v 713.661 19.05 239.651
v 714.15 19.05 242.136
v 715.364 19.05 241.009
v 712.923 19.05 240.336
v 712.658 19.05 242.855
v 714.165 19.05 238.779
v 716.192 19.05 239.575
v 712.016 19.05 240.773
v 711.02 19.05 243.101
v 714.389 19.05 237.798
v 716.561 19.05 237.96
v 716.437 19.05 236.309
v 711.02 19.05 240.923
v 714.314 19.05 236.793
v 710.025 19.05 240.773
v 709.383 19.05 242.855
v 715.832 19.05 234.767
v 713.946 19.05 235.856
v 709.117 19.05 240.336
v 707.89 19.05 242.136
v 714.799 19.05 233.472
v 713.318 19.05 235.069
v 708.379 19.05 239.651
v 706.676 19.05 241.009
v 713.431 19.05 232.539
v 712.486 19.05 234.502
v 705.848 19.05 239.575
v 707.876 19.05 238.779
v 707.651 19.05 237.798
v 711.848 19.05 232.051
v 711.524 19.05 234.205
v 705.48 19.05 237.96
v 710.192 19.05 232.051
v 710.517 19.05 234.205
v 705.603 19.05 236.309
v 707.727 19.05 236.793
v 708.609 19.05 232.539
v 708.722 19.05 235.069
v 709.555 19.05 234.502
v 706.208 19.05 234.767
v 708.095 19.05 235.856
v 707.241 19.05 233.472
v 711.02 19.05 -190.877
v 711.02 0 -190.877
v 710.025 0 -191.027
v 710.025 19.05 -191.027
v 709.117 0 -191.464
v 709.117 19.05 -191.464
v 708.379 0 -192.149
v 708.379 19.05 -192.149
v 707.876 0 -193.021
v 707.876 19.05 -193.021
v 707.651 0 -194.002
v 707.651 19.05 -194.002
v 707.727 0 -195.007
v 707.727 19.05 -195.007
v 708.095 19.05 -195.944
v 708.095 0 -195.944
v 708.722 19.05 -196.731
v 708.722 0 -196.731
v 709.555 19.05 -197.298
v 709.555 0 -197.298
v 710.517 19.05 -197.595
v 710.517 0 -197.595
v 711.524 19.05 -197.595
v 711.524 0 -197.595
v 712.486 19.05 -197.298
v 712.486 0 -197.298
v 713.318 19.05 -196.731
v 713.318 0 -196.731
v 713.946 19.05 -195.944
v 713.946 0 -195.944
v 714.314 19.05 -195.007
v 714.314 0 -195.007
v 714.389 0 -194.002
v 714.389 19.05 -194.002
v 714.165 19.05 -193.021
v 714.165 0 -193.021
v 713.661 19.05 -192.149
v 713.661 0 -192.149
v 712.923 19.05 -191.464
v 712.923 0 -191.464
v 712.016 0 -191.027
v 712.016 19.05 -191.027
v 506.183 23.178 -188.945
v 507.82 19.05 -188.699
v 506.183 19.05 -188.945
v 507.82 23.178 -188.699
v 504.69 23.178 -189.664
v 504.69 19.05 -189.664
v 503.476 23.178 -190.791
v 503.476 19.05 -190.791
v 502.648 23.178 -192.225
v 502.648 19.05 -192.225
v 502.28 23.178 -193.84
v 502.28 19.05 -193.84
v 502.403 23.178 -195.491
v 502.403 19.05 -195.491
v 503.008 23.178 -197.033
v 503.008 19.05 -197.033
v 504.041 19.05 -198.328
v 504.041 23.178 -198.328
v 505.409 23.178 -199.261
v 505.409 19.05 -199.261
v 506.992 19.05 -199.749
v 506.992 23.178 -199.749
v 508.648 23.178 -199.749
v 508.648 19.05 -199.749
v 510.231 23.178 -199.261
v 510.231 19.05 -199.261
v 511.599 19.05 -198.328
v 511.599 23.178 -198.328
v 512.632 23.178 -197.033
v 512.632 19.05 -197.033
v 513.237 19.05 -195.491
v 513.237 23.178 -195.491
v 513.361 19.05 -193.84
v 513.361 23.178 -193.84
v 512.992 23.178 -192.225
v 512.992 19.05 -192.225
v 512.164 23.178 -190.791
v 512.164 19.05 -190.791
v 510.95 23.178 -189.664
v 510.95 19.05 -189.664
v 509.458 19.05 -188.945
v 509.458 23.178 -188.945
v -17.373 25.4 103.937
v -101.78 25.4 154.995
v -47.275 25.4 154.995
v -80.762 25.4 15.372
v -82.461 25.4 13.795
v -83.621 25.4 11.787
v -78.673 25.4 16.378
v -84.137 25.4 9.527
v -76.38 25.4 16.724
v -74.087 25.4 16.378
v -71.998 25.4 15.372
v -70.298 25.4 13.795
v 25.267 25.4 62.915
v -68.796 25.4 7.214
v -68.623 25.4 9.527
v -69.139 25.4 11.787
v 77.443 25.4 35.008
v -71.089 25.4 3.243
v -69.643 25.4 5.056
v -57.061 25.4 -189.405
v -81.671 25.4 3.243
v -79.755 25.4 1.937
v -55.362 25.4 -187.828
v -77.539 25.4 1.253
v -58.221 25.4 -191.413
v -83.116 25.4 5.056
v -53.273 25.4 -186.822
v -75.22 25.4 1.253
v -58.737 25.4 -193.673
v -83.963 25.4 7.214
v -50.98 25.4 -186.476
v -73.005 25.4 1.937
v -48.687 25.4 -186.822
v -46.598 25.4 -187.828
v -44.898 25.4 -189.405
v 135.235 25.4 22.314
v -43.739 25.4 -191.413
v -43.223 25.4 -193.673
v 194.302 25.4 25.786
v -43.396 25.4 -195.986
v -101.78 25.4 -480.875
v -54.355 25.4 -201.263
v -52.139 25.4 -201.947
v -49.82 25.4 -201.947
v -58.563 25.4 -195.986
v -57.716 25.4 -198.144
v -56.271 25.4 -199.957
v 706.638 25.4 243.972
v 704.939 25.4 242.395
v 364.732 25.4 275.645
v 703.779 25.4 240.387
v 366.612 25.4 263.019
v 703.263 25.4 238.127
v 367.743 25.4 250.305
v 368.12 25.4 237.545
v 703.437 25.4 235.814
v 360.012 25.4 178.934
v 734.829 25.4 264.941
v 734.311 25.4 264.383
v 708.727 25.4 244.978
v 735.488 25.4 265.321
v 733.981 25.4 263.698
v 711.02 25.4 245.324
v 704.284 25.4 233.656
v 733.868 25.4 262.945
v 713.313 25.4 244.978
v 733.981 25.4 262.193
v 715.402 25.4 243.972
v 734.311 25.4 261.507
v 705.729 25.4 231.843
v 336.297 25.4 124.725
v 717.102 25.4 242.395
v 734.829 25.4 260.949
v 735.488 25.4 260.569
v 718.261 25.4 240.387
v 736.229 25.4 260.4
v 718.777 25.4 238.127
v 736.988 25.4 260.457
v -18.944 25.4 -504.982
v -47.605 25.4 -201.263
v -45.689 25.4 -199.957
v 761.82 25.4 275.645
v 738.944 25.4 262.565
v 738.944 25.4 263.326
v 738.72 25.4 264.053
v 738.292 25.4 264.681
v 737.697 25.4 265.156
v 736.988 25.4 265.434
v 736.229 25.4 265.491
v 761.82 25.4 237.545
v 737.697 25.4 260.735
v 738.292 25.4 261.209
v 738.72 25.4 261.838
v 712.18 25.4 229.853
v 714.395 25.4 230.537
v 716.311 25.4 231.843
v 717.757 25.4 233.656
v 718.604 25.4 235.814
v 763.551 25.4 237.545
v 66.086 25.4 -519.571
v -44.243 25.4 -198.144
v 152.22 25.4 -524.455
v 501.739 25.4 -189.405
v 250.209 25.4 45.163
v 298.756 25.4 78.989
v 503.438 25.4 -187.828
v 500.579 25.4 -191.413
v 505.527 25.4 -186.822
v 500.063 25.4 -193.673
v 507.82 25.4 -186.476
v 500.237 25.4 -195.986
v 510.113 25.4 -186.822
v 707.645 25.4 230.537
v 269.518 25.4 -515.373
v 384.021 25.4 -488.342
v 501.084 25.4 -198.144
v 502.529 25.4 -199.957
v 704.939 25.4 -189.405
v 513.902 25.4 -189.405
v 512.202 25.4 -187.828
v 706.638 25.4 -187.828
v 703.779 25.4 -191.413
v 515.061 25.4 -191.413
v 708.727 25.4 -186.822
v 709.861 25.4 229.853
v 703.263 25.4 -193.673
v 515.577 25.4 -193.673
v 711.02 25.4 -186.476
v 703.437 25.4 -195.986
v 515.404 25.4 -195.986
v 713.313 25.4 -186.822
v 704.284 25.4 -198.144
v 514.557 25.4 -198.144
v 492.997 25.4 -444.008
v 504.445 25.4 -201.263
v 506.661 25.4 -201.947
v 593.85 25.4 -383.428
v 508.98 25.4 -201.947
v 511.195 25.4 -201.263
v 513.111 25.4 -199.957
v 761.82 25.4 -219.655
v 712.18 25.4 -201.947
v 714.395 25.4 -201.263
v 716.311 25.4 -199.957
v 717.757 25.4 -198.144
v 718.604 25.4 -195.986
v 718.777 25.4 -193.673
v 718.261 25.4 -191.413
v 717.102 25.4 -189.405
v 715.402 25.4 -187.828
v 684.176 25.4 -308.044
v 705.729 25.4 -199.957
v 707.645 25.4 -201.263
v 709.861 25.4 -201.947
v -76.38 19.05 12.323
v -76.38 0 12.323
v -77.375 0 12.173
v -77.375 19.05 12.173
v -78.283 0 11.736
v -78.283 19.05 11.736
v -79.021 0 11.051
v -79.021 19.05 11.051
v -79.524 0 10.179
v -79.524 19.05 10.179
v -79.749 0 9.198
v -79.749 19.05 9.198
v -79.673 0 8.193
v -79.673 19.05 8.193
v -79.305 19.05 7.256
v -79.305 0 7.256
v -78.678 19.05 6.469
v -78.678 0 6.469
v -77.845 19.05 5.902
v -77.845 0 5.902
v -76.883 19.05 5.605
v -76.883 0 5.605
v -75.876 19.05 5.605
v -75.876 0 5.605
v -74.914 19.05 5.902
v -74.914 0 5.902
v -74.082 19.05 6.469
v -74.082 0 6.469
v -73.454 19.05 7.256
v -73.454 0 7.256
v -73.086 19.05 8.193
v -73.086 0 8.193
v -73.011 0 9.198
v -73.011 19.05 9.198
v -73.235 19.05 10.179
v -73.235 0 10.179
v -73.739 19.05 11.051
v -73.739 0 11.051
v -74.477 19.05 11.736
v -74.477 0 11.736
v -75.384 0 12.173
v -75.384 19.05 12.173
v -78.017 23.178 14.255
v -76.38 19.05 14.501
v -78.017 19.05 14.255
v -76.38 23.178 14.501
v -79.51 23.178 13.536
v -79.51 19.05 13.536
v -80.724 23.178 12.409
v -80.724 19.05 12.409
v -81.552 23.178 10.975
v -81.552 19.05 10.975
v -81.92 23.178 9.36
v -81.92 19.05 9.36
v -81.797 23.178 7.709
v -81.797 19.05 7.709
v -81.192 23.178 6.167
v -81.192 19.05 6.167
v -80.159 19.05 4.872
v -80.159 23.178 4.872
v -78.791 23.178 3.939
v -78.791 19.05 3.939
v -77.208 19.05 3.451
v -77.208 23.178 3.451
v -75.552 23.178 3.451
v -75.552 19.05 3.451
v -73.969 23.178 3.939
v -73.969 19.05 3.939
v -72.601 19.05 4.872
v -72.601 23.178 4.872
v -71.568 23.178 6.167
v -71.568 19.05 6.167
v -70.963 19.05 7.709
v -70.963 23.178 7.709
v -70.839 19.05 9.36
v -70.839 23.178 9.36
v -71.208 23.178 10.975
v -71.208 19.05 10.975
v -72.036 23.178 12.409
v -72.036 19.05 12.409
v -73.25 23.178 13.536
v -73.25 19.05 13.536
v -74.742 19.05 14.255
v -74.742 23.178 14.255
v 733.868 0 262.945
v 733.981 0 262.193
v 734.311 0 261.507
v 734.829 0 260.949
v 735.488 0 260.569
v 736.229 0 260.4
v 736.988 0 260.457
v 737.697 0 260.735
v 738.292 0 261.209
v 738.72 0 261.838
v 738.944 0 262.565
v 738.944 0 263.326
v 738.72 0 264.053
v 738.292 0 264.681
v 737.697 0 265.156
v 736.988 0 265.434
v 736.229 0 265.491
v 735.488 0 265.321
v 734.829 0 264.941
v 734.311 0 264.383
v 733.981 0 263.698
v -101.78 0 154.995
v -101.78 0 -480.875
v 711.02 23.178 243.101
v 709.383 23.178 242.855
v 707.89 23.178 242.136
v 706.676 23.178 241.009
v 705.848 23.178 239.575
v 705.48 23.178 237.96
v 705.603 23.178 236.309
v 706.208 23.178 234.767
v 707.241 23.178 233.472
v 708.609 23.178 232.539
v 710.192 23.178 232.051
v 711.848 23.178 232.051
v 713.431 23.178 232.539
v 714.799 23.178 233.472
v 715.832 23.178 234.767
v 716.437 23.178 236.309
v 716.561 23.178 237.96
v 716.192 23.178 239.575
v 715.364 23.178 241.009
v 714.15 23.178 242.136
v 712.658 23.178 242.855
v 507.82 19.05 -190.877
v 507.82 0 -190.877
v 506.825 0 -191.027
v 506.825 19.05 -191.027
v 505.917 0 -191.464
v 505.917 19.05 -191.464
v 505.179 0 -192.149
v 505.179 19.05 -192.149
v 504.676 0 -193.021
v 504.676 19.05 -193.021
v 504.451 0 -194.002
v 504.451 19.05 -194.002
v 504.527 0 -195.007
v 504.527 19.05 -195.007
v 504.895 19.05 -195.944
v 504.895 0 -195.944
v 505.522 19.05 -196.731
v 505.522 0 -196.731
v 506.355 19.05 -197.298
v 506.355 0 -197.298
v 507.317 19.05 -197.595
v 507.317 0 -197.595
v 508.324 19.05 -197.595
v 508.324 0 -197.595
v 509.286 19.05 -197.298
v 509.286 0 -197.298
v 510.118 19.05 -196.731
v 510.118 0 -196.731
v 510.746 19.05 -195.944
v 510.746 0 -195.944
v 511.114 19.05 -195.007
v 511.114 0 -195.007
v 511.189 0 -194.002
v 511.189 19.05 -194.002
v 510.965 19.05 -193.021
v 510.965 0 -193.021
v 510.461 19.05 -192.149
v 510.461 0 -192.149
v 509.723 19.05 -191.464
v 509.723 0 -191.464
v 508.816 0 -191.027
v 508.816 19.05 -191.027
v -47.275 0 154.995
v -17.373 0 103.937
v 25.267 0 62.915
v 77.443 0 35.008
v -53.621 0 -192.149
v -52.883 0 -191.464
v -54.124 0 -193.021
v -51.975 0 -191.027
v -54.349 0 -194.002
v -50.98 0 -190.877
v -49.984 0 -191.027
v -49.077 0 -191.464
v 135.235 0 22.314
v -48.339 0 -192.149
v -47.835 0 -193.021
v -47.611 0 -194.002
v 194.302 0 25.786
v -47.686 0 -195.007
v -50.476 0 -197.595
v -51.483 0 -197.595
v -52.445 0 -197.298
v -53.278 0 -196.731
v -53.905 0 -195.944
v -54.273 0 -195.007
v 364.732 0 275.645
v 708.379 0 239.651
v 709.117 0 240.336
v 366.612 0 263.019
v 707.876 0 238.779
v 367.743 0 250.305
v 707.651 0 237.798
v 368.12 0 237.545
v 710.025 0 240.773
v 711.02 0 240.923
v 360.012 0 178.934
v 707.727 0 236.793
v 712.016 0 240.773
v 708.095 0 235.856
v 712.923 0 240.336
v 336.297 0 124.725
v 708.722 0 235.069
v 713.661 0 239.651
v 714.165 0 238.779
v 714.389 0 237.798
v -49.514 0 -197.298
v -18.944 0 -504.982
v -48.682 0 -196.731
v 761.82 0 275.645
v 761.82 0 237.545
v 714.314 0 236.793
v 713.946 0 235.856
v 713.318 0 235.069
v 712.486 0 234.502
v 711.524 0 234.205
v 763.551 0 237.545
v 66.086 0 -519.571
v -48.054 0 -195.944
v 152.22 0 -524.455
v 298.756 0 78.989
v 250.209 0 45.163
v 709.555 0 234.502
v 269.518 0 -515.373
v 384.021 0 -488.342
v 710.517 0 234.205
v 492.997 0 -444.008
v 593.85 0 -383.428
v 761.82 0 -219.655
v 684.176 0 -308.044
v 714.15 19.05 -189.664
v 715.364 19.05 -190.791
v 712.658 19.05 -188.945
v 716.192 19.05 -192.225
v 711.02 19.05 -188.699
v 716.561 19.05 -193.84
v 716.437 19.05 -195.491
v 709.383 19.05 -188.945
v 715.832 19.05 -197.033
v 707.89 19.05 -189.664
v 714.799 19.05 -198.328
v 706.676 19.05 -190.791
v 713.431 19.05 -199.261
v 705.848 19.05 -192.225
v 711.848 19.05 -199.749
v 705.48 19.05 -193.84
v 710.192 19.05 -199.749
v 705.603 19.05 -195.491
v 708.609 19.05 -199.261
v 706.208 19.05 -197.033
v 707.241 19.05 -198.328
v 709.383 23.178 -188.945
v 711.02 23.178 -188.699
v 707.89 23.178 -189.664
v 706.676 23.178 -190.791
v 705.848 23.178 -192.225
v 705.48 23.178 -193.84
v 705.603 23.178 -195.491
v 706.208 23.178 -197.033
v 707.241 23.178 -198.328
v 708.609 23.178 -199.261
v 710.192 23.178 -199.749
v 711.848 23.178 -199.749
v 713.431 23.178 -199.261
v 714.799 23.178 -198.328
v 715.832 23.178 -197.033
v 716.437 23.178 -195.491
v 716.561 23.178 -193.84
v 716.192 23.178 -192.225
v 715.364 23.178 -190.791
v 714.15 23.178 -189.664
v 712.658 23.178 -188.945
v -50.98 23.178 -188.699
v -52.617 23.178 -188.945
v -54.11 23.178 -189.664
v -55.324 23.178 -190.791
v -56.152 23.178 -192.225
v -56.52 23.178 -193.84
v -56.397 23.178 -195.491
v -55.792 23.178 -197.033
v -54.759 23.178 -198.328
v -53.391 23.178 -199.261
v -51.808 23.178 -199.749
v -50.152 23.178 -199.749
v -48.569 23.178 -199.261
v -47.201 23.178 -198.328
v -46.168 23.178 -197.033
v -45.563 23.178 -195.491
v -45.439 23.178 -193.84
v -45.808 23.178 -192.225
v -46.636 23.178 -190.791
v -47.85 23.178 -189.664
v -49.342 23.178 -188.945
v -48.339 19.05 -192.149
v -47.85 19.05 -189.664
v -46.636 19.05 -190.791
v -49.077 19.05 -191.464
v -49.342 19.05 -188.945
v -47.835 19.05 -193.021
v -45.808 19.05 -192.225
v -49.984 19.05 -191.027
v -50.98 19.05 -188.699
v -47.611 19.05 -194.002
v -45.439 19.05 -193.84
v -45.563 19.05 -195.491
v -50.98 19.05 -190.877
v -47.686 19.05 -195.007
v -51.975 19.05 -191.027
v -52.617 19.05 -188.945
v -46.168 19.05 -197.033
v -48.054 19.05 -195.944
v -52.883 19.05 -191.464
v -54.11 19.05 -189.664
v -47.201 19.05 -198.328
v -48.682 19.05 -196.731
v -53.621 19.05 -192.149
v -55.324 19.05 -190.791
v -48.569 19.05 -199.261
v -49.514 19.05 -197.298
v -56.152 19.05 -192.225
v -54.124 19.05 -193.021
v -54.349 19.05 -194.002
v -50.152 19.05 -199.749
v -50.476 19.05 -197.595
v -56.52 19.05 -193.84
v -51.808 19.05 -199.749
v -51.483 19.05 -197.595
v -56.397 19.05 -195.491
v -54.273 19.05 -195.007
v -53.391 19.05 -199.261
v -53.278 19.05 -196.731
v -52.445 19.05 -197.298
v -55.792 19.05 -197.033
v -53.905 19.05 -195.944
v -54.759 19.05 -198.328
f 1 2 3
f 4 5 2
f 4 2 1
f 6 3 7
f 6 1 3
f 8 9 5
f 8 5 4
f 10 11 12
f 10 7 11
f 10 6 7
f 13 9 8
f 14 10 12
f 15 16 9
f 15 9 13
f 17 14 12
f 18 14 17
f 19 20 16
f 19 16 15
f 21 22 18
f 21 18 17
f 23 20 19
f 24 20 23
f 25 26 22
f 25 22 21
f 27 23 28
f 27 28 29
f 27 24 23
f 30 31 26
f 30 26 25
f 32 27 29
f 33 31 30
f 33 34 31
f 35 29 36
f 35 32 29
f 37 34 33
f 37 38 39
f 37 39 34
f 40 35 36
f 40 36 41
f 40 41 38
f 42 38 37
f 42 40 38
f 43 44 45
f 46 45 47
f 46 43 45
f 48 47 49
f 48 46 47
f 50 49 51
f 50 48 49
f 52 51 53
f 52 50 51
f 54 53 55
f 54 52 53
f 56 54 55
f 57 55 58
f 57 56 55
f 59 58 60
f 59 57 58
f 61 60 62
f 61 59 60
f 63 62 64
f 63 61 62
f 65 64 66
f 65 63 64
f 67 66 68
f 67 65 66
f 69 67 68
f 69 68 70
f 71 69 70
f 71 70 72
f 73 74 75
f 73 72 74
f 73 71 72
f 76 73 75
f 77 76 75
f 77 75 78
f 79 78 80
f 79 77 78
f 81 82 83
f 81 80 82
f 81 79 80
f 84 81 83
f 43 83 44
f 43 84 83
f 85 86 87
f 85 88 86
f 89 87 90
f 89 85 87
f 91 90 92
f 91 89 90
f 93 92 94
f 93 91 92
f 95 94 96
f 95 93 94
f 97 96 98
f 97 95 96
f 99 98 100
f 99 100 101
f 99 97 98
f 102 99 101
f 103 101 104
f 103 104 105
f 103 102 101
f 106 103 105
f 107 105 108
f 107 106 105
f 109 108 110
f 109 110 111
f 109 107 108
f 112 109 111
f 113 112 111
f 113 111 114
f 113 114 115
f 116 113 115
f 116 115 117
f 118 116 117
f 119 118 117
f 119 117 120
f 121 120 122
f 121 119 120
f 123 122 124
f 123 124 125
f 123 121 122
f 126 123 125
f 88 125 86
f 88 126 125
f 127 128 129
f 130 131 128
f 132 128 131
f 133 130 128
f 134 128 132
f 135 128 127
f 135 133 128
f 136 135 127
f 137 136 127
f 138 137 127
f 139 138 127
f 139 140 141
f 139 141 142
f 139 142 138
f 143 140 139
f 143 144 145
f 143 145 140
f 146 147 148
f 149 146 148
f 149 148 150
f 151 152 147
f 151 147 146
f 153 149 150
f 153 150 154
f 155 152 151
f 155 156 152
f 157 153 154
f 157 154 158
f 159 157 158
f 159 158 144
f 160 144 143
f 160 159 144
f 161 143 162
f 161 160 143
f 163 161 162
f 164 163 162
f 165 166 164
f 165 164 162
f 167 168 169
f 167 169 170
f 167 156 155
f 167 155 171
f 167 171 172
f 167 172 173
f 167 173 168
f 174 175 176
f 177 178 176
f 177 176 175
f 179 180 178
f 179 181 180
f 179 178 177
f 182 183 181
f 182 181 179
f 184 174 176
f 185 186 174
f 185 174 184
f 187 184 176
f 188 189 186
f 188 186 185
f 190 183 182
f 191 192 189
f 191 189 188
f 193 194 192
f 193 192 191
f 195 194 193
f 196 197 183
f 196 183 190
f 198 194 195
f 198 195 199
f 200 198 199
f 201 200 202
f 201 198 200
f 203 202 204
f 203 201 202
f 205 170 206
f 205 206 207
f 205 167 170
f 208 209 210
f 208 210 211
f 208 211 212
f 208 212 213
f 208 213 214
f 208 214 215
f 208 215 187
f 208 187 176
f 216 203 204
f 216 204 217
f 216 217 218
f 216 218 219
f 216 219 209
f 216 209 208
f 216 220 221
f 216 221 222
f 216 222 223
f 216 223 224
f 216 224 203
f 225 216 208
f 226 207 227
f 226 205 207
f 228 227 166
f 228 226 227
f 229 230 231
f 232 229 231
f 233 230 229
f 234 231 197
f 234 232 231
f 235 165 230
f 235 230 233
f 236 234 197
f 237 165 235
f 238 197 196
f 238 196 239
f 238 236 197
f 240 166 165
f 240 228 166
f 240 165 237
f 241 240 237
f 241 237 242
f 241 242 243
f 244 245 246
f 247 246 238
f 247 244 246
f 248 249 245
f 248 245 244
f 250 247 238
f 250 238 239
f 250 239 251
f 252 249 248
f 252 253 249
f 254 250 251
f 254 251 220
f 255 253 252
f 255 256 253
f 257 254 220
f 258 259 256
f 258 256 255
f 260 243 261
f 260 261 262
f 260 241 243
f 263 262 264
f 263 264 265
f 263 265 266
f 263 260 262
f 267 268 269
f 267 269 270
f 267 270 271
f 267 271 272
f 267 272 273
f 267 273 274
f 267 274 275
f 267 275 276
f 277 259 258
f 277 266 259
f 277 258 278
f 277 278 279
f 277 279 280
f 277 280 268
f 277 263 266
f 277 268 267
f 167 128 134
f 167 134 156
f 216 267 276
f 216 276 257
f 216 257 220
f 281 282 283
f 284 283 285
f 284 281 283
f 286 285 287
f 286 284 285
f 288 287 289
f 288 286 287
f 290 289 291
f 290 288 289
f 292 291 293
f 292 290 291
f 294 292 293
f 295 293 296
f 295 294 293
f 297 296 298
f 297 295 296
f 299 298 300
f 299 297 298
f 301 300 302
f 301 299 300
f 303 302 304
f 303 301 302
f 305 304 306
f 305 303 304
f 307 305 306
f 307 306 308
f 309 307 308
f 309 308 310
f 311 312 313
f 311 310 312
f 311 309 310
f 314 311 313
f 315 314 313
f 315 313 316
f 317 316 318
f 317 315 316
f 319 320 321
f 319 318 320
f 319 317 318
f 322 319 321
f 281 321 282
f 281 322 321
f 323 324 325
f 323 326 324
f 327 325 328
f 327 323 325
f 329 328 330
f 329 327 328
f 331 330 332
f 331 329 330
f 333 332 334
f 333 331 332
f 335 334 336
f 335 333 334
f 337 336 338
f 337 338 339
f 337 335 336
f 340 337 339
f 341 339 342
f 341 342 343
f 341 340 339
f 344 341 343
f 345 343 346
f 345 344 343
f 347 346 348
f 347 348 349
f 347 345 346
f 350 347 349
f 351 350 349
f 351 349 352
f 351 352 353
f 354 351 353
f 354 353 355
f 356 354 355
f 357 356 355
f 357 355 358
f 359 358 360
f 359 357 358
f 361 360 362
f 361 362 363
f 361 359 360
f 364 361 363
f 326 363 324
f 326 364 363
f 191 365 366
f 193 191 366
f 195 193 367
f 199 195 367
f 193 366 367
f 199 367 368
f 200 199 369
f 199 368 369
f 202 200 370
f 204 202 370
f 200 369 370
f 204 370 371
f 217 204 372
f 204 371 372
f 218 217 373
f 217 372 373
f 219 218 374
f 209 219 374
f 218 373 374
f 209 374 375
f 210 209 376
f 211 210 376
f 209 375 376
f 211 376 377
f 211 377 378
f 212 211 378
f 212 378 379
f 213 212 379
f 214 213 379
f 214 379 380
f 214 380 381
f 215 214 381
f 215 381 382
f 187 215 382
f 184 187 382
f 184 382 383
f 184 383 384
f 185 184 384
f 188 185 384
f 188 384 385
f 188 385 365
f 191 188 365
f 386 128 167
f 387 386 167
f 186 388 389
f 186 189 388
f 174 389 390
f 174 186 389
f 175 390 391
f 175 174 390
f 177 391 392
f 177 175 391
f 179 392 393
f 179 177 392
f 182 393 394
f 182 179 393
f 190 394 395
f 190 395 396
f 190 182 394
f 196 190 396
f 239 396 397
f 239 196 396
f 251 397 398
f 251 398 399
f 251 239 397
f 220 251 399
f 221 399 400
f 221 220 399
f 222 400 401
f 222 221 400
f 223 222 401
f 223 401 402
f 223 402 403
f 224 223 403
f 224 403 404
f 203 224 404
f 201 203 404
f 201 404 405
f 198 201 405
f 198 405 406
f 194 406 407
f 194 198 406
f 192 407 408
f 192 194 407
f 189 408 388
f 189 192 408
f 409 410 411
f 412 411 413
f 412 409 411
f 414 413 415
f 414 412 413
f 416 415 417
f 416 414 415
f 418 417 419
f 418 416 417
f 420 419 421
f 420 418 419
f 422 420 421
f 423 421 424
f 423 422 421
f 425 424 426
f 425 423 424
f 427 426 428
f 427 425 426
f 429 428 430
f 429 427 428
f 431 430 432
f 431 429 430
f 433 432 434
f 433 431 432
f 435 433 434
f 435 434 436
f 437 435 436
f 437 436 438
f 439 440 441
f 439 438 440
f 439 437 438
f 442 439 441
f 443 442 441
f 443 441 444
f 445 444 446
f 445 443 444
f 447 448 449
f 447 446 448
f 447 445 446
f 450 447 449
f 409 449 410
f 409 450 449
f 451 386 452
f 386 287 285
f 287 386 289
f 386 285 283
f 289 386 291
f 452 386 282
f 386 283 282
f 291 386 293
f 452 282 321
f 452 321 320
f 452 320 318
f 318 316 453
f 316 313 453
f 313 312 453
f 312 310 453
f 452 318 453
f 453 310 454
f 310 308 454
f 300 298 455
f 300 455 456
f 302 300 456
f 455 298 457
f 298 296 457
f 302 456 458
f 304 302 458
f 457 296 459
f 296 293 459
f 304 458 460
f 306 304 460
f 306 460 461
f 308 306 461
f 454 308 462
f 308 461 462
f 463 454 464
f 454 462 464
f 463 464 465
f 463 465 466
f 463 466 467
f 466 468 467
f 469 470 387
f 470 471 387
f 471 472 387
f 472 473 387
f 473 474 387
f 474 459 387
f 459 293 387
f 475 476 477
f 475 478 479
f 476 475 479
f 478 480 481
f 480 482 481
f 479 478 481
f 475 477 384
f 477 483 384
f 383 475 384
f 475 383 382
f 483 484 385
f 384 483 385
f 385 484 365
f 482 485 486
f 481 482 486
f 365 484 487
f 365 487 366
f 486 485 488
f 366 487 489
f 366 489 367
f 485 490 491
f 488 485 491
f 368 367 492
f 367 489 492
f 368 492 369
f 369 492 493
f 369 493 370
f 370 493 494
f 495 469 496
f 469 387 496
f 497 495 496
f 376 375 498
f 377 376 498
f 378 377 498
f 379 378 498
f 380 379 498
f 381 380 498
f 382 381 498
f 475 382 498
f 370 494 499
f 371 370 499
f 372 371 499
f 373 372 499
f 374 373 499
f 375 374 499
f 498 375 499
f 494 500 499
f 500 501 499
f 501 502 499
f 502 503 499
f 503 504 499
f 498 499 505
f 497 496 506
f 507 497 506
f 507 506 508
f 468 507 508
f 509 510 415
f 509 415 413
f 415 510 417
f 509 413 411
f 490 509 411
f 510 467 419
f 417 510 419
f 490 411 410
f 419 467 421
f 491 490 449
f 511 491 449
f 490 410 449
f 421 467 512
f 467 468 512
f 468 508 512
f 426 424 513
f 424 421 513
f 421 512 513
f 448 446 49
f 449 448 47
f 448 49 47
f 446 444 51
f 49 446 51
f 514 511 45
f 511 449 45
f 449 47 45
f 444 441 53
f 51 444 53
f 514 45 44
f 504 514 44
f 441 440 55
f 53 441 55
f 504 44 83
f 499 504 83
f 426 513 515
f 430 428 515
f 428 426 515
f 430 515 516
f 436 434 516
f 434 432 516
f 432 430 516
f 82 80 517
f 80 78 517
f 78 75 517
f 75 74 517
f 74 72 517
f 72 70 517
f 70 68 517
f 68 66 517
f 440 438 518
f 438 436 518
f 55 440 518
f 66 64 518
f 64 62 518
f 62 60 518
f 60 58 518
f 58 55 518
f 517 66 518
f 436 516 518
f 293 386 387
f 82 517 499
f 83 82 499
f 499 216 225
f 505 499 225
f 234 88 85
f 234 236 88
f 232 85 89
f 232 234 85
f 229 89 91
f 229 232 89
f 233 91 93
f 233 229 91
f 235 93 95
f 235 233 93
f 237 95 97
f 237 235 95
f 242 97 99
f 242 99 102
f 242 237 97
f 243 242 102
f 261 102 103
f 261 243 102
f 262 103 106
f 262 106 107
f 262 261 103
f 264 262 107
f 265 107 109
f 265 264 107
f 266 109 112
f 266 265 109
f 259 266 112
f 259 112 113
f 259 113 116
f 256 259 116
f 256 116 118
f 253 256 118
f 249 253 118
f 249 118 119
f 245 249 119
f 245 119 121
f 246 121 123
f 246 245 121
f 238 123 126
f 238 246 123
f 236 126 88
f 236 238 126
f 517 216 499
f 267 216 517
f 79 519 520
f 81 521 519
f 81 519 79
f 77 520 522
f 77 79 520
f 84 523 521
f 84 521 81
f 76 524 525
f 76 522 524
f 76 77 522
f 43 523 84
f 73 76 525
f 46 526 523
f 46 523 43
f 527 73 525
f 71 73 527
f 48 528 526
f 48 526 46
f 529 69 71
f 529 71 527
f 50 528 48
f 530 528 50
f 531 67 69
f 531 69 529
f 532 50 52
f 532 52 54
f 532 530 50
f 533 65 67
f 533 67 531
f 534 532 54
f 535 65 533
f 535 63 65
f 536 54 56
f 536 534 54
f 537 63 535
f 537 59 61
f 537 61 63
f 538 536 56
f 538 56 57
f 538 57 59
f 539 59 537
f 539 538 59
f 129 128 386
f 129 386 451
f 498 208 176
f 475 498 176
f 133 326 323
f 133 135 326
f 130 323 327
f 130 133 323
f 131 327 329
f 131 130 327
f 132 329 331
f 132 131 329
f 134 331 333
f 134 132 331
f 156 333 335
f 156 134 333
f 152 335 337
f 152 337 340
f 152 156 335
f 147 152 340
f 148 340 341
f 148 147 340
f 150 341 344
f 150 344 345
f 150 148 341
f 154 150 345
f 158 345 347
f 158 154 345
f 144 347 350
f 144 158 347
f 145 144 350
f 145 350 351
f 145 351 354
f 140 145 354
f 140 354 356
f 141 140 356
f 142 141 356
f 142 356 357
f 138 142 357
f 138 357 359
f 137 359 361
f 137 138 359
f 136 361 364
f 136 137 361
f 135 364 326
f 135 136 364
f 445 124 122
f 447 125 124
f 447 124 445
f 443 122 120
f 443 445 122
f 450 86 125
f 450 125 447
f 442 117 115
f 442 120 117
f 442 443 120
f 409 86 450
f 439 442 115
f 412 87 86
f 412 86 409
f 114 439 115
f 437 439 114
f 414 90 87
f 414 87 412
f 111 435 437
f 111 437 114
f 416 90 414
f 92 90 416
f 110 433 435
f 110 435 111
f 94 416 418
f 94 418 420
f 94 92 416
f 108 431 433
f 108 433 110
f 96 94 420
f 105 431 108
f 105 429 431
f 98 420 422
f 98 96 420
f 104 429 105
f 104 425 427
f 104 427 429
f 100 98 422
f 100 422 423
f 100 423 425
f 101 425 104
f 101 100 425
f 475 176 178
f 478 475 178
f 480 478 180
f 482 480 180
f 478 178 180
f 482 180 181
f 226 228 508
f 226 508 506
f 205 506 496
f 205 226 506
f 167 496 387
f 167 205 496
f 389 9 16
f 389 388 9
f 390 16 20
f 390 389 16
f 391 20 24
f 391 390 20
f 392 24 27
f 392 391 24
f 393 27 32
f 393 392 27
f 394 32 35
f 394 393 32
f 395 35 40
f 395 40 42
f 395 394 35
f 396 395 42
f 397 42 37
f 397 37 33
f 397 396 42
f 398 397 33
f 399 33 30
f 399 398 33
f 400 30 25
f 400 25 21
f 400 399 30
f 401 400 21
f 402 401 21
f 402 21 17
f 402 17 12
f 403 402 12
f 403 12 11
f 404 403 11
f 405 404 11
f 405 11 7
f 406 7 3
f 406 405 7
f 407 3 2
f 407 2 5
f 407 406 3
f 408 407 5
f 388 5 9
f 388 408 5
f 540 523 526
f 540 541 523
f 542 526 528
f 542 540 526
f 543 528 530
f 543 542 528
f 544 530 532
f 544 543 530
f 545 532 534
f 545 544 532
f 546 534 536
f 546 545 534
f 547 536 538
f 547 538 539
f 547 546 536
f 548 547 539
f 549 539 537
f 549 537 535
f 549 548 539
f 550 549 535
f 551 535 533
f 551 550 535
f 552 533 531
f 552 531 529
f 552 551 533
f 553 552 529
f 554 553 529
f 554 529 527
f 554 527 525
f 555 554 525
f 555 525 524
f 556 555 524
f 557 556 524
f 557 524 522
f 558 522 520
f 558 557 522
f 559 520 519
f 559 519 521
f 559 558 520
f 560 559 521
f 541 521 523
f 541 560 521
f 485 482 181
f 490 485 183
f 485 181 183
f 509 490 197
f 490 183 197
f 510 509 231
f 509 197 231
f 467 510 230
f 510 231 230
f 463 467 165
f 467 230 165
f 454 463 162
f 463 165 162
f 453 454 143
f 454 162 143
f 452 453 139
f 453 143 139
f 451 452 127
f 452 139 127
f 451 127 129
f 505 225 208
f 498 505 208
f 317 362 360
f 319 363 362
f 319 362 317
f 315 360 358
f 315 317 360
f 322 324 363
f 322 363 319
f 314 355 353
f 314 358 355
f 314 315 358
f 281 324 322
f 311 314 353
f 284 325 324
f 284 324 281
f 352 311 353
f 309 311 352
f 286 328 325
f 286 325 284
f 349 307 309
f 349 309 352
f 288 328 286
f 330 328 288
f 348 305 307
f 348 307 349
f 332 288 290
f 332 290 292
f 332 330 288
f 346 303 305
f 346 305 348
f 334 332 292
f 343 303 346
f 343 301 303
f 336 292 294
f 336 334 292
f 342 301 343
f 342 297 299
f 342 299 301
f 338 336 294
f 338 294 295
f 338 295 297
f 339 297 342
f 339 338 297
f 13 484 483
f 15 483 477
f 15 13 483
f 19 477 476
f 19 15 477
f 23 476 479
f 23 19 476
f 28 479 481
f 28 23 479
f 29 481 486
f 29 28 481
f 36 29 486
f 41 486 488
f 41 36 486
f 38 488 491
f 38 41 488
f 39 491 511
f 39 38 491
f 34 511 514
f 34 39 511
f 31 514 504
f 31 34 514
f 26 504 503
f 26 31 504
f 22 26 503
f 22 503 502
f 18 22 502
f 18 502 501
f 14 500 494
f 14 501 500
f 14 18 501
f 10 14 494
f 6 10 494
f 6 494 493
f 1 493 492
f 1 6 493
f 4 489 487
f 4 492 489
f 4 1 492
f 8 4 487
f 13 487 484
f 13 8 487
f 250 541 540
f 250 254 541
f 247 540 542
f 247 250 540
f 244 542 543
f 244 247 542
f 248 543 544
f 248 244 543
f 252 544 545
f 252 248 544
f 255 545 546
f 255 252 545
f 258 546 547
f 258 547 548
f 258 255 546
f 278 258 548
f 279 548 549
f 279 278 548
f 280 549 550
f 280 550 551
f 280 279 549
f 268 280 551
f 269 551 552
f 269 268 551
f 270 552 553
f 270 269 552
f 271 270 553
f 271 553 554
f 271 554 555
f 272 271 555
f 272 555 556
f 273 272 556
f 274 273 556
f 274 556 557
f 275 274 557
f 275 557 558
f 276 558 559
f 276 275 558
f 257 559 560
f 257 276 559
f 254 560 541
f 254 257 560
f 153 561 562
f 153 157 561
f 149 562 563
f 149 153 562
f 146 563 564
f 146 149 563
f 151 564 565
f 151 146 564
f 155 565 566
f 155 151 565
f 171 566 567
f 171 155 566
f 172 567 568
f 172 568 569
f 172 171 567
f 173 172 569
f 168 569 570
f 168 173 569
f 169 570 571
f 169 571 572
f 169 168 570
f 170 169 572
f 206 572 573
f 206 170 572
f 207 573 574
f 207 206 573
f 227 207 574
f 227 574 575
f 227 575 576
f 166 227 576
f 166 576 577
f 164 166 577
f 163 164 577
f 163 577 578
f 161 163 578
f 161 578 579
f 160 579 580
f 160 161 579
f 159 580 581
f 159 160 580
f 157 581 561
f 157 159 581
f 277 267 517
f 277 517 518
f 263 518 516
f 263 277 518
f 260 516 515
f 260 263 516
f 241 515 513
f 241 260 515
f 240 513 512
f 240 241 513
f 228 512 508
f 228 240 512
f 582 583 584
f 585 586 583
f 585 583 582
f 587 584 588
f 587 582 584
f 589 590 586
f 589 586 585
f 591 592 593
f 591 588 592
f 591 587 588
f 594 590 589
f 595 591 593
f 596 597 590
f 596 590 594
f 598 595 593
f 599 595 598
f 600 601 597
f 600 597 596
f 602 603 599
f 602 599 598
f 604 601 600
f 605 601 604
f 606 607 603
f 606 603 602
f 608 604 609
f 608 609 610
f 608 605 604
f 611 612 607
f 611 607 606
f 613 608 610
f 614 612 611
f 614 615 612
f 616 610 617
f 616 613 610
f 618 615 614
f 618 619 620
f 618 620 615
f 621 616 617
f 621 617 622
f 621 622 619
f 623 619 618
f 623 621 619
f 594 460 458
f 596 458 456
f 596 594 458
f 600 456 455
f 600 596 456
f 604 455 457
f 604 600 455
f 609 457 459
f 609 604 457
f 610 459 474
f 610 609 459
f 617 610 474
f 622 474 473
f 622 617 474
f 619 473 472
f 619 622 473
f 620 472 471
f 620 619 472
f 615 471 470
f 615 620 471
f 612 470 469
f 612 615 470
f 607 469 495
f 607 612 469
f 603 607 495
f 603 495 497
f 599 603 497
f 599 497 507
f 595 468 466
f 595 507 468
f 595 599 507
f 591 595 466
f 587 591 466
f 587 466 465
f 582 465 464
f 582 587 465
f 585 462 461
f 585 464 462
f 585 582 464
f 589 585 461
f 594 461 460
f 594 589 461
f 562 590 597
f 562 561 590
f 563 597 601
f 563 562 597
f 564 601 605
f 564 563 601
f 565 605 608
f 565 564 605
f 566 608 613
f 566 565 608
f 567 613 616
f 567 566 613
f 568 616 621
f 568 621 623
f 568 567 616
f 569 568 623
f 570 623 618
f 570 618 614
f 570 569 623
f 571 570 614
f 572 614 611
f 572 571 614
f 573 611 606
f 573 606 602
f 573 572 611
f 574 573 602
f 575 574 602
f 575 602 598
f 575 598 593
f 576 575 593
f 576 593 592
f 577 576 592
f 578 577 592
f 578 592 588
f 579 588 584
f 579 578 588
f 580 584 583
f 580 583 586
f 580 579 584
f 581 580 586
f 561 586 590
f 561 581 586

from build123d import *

# Parameters (mm, degrees)
SKETCH2_W                                     = 2006.6
SKETCH2_H                                     = 762
BOSS_EXTRUDE1_DEPTH                           = 25.4
BOSS_EXTRUDE4_DEPTH                           = 25.4
F_1_4_20_TAPPED_HOLE1_D                       = 5.1054
SKETCH5_R                                     = 215.9
CUT_EXTRUDE2_DEPTH                            = 26.4
SKETCH10_W                                    = 304.8
SKETCH10_H                                    = 762
CUT_EXTRUDE5_DEPTH                            = 26.4
SKETCH31_W                                    = 381
SKETCH31_H                                    = 82.55
CUT_EXTRUDE8_DEPTH                            = 26.4
CUT_EXTRUDE9_DEPTH                            = 26.4
CUT_EXTRUDE10_DEPTH                           = 26.4
SKETCH41_W                                    = 838.2
SKETCH41_H                                    = 457.2
CUT_EXTRUDE11_DEPTH                           = 26.4
CBORE_FOR_1_4_SOCKET_HEAD_CAP_SCREW1_AT_COUNT = 2
CBORE_FOR_1_4_SOCKET_HEAD_CAP_SCREW1_AT_PITCH = 204.781346807
CBORE_FOR_1_4_SOCKET_HEAD_CAP_SCREW1_2_COUNT  = 2
CBORE_FOR_1_4_SOCKET_HEAD_CAP_SCREW1_2_PITCH  = 618.530419624
CBORE_FOR_1_4_SOCKET_HEAD_CAP_SCREW1_3_COUNT  = 2
CBORE_FOR_1_4_SOCKET_HEAD_CAP_SCREW1_3_PITCH  = 819.912629492
CBORE_FOR_1_4_SOCKET_HEAD_CAP_SCREW1_4_COUNT  = 2
CBORE_FOR_1_4_SOCKET_HEAD_CAP_SCREW1_4_PITCH  = 813.196778154


with BuildPart() as part:
    # Sketch2 → Boss-Extrude1 (new body)
    with BuildSketch(Plane(origin=(0, 0, 0), x_dir=(1, 0, 0), z_dir=(0, 1, 0))):
        with Locations((596.720248579, 143.454782609)):
            Rectangle(SKETCH2_W, SKETCH2_H)
    extrude(amount=BOSS_EXTRUDE1_DEPTH)

    # Sketch63 → Boss-Extrude4 (add)
    with BuildSketch(Plane(origin=(0, 25.4, 0), x_dir=(1, 0, 0), z_dir=(0, 1, 0))):
        with BuildLine():
            Line((368.120248579, -237.545217391), (763.550813985, -237.545217391))
            Line((763.550813985, -237.545217391), (761.820248579, -275.645217391))
            Line((761.820248579, -275.645217391), (364.731895319, -275.645217391))
            ThreePointArc((364.731895319, -275.645217391), (367.271491927, -256.670403258), (368.120248579, -237.545217391))
        make_face()
    extrude(amount=-BOSS_EXTRUDE4_DEPTH)

    # 1/4-20 Tapped Hole1 (through all)
    with Locations(Plane(origin=(0, 25.4, 0), x_dir=(1, 0, 0), z_dir=(0, 1, 0))):
        with Locations((736.420248579, -262.945217391)):
            Hole(F_1_4_20_TAPPED_HOLE1_D / 2)

    # Sketch5 → Cut-Extrude2 (cut, through all)
    with BuildSketch(Plane(origin=(0, 25.4, 0), x_dir=(1, 0, 0), z_dir=(0, 1, 0))):
        with Locations((152.220248579, -237.545217391)):
            Circle(SKETCH5_R)
    extrude(amount=-CUT_EXTRUDE2_DEPTH, mode=Mode.SUBTRACT)

    # Sketch10 → Cut-Extrude5 (cut, through all)
    with BuildSketch(Plane(origin=(0, 25.4, 0), x_dir=(1, 0, 0), z_dir=(0, 1, 0))):
        with Locations((-254.179751421, 143.454782609)):
            Rectangle(SKETCH10_W, SKETCH10_H)
    extrude(amount=-CUT_EXTRUDE5_DEPTH, mode=Mode.SUBTRACT)

    # Sketch31 → Cut-Extrude8 (cut, through all)
    with BuildSketch(Plane(origin=(0, 25.4, 0), x_dir=(1, 0, 0), z_dir=(0, 1, 0))):
        with Locations((-216.079751421, -196.270217391)):
            Rectangle(SKETCH31_W, SKETCH31_H)
    extrude(amount=-CUT_EXTRUDE8_DEPTH, mode=Mode.SUBTRACT)

    # Sketch39 → Cut-Extrude9 (cut, through all)
    with BuildSketch(Plane(origin=(0, 25.4, 0), x_dir=(1, 0, 0), z_dir=(0, 1, 0))):
        with BuildLine():
            Line((-101.779751421, 480.875272294), (-101.779751421, 524.454782609))
            Line((-101.779751421, 524.454782609), (152.220248579, 524.454782609))
            ThreePointArc((152.220248579, 524.454782609), (23.36454079, 513.480885065), (-101.779751421, 480.875272294))
        make_face()
    extrude(amount=-CUT_EXTRUDE9_DEPTH, mode=Mode.SUBTRACT)

    # Sketch40 → Cut-Extrude10 (cut, through all)
    with BuildSketch(Plane(origin=(0, 25.4, 0), x_dir=(1, 0, 0), z_dir=(0, 1, 0))):
        with BuildLine():
            Line((152.220248579, 524.454782609), (1600.020248579, 524.454782609))
            Line((1600.020248579, 524.454782609), (1600.020248579, 219.654782609))
            Line((1600.020248579, 219.654782609), (761.820248579, 219.654782609))
            ThreePointArc((761.820248579, 219.654782609), (492.99700835, 444.008302151), (152.220248579, 524.454782609))
        make_face()
    extrude(amount=-CUT_EXTRUDE10_DEPTH, mode=Mode.SUBTRACT)

    # Sketch41 → Cut-Extrude11 (cut, through all)
    with BuildSketch(Plane(origin=(0, 25.4, 0), x_dir=(1, 0, 0), z_dir=(0, 1, 0))):
        with Locations((1180.920248579, -8.945217391)):
            Rectangle(SKETCH41_W, SKETCH41_H)
    extrude(amount=-CUT_EXTRUDE11_DEPTH, mode=Mode.SUBTRACT)

    # Sketch67 → CBORE for 1/4 Socket Head Cap Screw1 (revolve, cut)
    with BuildSketch(Plane(origin=(-76.379751421, 25.4, 8.945217391), x_dir=(0, 0, 1), z_dir=(1, 0, 0))):
        Polygon((0, 0), (0, 25.40005), (3.3782, 25.40005), (3.3782, 6.35), (5.55625, 6.35), (5.55625, 2.2225), (7.77875, 0), align=None)
    cbore_for_1_4_socket_head_cap_screw1 = revolve(axis=Axis((-76.379751421, 31.75, 8.945217391), (0, -1, 0)), mode=Mode.SUBTRACT)

    # CBORE for 1/4 Socket Head Cap Screw1 at: CBORE for 1/4 Socket Head Cap Screw1 ×2
    with Locations(*[Vector(0.124034735, 0, -0.992277877) * (i * CBORE_FOR_1_4_SOCKET_HEAD_CAP_SCREW1_AT_PITCH) for i in range(1, CBORE_FOR_1_4_SOCKET_HEAD_CAP_SCREW1_AT_COUNT)]):
        add(cbore_for_1_4_socket_head_cap_screw1, mode=Mode.SUBTRACT)

    # CBORE for 1_4 Socket Head Cap Screw1 2: CBORE for 1/4 Socket Head Cap Screw1 ×2
    with Locations(*[Vector(0.944496797, 0, -0.328520625) * (i * CBORE_FOR_1_4_SOCKET_HEAD_CAP_SCREW1_2_PITCH) for i in range(1, CBORE_FOR_1_4_SOCKET_HEAD_CAP_SCREW1_2_COUNT)]):
        add(cbore_for_1_4_socket_head_cap_screw1, mode=Mode.SUBTRACT)

    # CBORE for 1_4 Socket Head Cap Screw1 3: CBORE for 1/4 Socket Head Cap Screw1 ×2
    with Locations(*[Vector(0.960346227, 0, 0.278810195) * (i * CBORE_FOR_1_4_SOCKET_HEAD_CAP_SCREW1_3_PITCH) for i in range(1, CBORE_FOR_1_4_SOCKET_HEAD_CAP_SCREW1_3_COUNT)]):
        add(cbore_for_1_4_socket_head_cap_screw1, mode=Mode.SUBTRACT)

    # CBORE for 1_4 Socket Head Cap Screw1 4: CBORE for 1/4 Socket Head Cap Screw1 ×2
    with Locations(*[Vector(0.968277324, 0, -0.249878019) * (i * CBORE_FOR_1_4_SOCKET_HEAD_CAP_SCREW1_4_PITCH) for i in range(1, CBORE_FOR_1_4_SOCKET_HEAD_CAP_SCREW1_4_COUNT)]):
        add(cbore_for_1_4_socket_head_cap_screw1, mode=Mode.SUBTRACT)


solid = part.part
